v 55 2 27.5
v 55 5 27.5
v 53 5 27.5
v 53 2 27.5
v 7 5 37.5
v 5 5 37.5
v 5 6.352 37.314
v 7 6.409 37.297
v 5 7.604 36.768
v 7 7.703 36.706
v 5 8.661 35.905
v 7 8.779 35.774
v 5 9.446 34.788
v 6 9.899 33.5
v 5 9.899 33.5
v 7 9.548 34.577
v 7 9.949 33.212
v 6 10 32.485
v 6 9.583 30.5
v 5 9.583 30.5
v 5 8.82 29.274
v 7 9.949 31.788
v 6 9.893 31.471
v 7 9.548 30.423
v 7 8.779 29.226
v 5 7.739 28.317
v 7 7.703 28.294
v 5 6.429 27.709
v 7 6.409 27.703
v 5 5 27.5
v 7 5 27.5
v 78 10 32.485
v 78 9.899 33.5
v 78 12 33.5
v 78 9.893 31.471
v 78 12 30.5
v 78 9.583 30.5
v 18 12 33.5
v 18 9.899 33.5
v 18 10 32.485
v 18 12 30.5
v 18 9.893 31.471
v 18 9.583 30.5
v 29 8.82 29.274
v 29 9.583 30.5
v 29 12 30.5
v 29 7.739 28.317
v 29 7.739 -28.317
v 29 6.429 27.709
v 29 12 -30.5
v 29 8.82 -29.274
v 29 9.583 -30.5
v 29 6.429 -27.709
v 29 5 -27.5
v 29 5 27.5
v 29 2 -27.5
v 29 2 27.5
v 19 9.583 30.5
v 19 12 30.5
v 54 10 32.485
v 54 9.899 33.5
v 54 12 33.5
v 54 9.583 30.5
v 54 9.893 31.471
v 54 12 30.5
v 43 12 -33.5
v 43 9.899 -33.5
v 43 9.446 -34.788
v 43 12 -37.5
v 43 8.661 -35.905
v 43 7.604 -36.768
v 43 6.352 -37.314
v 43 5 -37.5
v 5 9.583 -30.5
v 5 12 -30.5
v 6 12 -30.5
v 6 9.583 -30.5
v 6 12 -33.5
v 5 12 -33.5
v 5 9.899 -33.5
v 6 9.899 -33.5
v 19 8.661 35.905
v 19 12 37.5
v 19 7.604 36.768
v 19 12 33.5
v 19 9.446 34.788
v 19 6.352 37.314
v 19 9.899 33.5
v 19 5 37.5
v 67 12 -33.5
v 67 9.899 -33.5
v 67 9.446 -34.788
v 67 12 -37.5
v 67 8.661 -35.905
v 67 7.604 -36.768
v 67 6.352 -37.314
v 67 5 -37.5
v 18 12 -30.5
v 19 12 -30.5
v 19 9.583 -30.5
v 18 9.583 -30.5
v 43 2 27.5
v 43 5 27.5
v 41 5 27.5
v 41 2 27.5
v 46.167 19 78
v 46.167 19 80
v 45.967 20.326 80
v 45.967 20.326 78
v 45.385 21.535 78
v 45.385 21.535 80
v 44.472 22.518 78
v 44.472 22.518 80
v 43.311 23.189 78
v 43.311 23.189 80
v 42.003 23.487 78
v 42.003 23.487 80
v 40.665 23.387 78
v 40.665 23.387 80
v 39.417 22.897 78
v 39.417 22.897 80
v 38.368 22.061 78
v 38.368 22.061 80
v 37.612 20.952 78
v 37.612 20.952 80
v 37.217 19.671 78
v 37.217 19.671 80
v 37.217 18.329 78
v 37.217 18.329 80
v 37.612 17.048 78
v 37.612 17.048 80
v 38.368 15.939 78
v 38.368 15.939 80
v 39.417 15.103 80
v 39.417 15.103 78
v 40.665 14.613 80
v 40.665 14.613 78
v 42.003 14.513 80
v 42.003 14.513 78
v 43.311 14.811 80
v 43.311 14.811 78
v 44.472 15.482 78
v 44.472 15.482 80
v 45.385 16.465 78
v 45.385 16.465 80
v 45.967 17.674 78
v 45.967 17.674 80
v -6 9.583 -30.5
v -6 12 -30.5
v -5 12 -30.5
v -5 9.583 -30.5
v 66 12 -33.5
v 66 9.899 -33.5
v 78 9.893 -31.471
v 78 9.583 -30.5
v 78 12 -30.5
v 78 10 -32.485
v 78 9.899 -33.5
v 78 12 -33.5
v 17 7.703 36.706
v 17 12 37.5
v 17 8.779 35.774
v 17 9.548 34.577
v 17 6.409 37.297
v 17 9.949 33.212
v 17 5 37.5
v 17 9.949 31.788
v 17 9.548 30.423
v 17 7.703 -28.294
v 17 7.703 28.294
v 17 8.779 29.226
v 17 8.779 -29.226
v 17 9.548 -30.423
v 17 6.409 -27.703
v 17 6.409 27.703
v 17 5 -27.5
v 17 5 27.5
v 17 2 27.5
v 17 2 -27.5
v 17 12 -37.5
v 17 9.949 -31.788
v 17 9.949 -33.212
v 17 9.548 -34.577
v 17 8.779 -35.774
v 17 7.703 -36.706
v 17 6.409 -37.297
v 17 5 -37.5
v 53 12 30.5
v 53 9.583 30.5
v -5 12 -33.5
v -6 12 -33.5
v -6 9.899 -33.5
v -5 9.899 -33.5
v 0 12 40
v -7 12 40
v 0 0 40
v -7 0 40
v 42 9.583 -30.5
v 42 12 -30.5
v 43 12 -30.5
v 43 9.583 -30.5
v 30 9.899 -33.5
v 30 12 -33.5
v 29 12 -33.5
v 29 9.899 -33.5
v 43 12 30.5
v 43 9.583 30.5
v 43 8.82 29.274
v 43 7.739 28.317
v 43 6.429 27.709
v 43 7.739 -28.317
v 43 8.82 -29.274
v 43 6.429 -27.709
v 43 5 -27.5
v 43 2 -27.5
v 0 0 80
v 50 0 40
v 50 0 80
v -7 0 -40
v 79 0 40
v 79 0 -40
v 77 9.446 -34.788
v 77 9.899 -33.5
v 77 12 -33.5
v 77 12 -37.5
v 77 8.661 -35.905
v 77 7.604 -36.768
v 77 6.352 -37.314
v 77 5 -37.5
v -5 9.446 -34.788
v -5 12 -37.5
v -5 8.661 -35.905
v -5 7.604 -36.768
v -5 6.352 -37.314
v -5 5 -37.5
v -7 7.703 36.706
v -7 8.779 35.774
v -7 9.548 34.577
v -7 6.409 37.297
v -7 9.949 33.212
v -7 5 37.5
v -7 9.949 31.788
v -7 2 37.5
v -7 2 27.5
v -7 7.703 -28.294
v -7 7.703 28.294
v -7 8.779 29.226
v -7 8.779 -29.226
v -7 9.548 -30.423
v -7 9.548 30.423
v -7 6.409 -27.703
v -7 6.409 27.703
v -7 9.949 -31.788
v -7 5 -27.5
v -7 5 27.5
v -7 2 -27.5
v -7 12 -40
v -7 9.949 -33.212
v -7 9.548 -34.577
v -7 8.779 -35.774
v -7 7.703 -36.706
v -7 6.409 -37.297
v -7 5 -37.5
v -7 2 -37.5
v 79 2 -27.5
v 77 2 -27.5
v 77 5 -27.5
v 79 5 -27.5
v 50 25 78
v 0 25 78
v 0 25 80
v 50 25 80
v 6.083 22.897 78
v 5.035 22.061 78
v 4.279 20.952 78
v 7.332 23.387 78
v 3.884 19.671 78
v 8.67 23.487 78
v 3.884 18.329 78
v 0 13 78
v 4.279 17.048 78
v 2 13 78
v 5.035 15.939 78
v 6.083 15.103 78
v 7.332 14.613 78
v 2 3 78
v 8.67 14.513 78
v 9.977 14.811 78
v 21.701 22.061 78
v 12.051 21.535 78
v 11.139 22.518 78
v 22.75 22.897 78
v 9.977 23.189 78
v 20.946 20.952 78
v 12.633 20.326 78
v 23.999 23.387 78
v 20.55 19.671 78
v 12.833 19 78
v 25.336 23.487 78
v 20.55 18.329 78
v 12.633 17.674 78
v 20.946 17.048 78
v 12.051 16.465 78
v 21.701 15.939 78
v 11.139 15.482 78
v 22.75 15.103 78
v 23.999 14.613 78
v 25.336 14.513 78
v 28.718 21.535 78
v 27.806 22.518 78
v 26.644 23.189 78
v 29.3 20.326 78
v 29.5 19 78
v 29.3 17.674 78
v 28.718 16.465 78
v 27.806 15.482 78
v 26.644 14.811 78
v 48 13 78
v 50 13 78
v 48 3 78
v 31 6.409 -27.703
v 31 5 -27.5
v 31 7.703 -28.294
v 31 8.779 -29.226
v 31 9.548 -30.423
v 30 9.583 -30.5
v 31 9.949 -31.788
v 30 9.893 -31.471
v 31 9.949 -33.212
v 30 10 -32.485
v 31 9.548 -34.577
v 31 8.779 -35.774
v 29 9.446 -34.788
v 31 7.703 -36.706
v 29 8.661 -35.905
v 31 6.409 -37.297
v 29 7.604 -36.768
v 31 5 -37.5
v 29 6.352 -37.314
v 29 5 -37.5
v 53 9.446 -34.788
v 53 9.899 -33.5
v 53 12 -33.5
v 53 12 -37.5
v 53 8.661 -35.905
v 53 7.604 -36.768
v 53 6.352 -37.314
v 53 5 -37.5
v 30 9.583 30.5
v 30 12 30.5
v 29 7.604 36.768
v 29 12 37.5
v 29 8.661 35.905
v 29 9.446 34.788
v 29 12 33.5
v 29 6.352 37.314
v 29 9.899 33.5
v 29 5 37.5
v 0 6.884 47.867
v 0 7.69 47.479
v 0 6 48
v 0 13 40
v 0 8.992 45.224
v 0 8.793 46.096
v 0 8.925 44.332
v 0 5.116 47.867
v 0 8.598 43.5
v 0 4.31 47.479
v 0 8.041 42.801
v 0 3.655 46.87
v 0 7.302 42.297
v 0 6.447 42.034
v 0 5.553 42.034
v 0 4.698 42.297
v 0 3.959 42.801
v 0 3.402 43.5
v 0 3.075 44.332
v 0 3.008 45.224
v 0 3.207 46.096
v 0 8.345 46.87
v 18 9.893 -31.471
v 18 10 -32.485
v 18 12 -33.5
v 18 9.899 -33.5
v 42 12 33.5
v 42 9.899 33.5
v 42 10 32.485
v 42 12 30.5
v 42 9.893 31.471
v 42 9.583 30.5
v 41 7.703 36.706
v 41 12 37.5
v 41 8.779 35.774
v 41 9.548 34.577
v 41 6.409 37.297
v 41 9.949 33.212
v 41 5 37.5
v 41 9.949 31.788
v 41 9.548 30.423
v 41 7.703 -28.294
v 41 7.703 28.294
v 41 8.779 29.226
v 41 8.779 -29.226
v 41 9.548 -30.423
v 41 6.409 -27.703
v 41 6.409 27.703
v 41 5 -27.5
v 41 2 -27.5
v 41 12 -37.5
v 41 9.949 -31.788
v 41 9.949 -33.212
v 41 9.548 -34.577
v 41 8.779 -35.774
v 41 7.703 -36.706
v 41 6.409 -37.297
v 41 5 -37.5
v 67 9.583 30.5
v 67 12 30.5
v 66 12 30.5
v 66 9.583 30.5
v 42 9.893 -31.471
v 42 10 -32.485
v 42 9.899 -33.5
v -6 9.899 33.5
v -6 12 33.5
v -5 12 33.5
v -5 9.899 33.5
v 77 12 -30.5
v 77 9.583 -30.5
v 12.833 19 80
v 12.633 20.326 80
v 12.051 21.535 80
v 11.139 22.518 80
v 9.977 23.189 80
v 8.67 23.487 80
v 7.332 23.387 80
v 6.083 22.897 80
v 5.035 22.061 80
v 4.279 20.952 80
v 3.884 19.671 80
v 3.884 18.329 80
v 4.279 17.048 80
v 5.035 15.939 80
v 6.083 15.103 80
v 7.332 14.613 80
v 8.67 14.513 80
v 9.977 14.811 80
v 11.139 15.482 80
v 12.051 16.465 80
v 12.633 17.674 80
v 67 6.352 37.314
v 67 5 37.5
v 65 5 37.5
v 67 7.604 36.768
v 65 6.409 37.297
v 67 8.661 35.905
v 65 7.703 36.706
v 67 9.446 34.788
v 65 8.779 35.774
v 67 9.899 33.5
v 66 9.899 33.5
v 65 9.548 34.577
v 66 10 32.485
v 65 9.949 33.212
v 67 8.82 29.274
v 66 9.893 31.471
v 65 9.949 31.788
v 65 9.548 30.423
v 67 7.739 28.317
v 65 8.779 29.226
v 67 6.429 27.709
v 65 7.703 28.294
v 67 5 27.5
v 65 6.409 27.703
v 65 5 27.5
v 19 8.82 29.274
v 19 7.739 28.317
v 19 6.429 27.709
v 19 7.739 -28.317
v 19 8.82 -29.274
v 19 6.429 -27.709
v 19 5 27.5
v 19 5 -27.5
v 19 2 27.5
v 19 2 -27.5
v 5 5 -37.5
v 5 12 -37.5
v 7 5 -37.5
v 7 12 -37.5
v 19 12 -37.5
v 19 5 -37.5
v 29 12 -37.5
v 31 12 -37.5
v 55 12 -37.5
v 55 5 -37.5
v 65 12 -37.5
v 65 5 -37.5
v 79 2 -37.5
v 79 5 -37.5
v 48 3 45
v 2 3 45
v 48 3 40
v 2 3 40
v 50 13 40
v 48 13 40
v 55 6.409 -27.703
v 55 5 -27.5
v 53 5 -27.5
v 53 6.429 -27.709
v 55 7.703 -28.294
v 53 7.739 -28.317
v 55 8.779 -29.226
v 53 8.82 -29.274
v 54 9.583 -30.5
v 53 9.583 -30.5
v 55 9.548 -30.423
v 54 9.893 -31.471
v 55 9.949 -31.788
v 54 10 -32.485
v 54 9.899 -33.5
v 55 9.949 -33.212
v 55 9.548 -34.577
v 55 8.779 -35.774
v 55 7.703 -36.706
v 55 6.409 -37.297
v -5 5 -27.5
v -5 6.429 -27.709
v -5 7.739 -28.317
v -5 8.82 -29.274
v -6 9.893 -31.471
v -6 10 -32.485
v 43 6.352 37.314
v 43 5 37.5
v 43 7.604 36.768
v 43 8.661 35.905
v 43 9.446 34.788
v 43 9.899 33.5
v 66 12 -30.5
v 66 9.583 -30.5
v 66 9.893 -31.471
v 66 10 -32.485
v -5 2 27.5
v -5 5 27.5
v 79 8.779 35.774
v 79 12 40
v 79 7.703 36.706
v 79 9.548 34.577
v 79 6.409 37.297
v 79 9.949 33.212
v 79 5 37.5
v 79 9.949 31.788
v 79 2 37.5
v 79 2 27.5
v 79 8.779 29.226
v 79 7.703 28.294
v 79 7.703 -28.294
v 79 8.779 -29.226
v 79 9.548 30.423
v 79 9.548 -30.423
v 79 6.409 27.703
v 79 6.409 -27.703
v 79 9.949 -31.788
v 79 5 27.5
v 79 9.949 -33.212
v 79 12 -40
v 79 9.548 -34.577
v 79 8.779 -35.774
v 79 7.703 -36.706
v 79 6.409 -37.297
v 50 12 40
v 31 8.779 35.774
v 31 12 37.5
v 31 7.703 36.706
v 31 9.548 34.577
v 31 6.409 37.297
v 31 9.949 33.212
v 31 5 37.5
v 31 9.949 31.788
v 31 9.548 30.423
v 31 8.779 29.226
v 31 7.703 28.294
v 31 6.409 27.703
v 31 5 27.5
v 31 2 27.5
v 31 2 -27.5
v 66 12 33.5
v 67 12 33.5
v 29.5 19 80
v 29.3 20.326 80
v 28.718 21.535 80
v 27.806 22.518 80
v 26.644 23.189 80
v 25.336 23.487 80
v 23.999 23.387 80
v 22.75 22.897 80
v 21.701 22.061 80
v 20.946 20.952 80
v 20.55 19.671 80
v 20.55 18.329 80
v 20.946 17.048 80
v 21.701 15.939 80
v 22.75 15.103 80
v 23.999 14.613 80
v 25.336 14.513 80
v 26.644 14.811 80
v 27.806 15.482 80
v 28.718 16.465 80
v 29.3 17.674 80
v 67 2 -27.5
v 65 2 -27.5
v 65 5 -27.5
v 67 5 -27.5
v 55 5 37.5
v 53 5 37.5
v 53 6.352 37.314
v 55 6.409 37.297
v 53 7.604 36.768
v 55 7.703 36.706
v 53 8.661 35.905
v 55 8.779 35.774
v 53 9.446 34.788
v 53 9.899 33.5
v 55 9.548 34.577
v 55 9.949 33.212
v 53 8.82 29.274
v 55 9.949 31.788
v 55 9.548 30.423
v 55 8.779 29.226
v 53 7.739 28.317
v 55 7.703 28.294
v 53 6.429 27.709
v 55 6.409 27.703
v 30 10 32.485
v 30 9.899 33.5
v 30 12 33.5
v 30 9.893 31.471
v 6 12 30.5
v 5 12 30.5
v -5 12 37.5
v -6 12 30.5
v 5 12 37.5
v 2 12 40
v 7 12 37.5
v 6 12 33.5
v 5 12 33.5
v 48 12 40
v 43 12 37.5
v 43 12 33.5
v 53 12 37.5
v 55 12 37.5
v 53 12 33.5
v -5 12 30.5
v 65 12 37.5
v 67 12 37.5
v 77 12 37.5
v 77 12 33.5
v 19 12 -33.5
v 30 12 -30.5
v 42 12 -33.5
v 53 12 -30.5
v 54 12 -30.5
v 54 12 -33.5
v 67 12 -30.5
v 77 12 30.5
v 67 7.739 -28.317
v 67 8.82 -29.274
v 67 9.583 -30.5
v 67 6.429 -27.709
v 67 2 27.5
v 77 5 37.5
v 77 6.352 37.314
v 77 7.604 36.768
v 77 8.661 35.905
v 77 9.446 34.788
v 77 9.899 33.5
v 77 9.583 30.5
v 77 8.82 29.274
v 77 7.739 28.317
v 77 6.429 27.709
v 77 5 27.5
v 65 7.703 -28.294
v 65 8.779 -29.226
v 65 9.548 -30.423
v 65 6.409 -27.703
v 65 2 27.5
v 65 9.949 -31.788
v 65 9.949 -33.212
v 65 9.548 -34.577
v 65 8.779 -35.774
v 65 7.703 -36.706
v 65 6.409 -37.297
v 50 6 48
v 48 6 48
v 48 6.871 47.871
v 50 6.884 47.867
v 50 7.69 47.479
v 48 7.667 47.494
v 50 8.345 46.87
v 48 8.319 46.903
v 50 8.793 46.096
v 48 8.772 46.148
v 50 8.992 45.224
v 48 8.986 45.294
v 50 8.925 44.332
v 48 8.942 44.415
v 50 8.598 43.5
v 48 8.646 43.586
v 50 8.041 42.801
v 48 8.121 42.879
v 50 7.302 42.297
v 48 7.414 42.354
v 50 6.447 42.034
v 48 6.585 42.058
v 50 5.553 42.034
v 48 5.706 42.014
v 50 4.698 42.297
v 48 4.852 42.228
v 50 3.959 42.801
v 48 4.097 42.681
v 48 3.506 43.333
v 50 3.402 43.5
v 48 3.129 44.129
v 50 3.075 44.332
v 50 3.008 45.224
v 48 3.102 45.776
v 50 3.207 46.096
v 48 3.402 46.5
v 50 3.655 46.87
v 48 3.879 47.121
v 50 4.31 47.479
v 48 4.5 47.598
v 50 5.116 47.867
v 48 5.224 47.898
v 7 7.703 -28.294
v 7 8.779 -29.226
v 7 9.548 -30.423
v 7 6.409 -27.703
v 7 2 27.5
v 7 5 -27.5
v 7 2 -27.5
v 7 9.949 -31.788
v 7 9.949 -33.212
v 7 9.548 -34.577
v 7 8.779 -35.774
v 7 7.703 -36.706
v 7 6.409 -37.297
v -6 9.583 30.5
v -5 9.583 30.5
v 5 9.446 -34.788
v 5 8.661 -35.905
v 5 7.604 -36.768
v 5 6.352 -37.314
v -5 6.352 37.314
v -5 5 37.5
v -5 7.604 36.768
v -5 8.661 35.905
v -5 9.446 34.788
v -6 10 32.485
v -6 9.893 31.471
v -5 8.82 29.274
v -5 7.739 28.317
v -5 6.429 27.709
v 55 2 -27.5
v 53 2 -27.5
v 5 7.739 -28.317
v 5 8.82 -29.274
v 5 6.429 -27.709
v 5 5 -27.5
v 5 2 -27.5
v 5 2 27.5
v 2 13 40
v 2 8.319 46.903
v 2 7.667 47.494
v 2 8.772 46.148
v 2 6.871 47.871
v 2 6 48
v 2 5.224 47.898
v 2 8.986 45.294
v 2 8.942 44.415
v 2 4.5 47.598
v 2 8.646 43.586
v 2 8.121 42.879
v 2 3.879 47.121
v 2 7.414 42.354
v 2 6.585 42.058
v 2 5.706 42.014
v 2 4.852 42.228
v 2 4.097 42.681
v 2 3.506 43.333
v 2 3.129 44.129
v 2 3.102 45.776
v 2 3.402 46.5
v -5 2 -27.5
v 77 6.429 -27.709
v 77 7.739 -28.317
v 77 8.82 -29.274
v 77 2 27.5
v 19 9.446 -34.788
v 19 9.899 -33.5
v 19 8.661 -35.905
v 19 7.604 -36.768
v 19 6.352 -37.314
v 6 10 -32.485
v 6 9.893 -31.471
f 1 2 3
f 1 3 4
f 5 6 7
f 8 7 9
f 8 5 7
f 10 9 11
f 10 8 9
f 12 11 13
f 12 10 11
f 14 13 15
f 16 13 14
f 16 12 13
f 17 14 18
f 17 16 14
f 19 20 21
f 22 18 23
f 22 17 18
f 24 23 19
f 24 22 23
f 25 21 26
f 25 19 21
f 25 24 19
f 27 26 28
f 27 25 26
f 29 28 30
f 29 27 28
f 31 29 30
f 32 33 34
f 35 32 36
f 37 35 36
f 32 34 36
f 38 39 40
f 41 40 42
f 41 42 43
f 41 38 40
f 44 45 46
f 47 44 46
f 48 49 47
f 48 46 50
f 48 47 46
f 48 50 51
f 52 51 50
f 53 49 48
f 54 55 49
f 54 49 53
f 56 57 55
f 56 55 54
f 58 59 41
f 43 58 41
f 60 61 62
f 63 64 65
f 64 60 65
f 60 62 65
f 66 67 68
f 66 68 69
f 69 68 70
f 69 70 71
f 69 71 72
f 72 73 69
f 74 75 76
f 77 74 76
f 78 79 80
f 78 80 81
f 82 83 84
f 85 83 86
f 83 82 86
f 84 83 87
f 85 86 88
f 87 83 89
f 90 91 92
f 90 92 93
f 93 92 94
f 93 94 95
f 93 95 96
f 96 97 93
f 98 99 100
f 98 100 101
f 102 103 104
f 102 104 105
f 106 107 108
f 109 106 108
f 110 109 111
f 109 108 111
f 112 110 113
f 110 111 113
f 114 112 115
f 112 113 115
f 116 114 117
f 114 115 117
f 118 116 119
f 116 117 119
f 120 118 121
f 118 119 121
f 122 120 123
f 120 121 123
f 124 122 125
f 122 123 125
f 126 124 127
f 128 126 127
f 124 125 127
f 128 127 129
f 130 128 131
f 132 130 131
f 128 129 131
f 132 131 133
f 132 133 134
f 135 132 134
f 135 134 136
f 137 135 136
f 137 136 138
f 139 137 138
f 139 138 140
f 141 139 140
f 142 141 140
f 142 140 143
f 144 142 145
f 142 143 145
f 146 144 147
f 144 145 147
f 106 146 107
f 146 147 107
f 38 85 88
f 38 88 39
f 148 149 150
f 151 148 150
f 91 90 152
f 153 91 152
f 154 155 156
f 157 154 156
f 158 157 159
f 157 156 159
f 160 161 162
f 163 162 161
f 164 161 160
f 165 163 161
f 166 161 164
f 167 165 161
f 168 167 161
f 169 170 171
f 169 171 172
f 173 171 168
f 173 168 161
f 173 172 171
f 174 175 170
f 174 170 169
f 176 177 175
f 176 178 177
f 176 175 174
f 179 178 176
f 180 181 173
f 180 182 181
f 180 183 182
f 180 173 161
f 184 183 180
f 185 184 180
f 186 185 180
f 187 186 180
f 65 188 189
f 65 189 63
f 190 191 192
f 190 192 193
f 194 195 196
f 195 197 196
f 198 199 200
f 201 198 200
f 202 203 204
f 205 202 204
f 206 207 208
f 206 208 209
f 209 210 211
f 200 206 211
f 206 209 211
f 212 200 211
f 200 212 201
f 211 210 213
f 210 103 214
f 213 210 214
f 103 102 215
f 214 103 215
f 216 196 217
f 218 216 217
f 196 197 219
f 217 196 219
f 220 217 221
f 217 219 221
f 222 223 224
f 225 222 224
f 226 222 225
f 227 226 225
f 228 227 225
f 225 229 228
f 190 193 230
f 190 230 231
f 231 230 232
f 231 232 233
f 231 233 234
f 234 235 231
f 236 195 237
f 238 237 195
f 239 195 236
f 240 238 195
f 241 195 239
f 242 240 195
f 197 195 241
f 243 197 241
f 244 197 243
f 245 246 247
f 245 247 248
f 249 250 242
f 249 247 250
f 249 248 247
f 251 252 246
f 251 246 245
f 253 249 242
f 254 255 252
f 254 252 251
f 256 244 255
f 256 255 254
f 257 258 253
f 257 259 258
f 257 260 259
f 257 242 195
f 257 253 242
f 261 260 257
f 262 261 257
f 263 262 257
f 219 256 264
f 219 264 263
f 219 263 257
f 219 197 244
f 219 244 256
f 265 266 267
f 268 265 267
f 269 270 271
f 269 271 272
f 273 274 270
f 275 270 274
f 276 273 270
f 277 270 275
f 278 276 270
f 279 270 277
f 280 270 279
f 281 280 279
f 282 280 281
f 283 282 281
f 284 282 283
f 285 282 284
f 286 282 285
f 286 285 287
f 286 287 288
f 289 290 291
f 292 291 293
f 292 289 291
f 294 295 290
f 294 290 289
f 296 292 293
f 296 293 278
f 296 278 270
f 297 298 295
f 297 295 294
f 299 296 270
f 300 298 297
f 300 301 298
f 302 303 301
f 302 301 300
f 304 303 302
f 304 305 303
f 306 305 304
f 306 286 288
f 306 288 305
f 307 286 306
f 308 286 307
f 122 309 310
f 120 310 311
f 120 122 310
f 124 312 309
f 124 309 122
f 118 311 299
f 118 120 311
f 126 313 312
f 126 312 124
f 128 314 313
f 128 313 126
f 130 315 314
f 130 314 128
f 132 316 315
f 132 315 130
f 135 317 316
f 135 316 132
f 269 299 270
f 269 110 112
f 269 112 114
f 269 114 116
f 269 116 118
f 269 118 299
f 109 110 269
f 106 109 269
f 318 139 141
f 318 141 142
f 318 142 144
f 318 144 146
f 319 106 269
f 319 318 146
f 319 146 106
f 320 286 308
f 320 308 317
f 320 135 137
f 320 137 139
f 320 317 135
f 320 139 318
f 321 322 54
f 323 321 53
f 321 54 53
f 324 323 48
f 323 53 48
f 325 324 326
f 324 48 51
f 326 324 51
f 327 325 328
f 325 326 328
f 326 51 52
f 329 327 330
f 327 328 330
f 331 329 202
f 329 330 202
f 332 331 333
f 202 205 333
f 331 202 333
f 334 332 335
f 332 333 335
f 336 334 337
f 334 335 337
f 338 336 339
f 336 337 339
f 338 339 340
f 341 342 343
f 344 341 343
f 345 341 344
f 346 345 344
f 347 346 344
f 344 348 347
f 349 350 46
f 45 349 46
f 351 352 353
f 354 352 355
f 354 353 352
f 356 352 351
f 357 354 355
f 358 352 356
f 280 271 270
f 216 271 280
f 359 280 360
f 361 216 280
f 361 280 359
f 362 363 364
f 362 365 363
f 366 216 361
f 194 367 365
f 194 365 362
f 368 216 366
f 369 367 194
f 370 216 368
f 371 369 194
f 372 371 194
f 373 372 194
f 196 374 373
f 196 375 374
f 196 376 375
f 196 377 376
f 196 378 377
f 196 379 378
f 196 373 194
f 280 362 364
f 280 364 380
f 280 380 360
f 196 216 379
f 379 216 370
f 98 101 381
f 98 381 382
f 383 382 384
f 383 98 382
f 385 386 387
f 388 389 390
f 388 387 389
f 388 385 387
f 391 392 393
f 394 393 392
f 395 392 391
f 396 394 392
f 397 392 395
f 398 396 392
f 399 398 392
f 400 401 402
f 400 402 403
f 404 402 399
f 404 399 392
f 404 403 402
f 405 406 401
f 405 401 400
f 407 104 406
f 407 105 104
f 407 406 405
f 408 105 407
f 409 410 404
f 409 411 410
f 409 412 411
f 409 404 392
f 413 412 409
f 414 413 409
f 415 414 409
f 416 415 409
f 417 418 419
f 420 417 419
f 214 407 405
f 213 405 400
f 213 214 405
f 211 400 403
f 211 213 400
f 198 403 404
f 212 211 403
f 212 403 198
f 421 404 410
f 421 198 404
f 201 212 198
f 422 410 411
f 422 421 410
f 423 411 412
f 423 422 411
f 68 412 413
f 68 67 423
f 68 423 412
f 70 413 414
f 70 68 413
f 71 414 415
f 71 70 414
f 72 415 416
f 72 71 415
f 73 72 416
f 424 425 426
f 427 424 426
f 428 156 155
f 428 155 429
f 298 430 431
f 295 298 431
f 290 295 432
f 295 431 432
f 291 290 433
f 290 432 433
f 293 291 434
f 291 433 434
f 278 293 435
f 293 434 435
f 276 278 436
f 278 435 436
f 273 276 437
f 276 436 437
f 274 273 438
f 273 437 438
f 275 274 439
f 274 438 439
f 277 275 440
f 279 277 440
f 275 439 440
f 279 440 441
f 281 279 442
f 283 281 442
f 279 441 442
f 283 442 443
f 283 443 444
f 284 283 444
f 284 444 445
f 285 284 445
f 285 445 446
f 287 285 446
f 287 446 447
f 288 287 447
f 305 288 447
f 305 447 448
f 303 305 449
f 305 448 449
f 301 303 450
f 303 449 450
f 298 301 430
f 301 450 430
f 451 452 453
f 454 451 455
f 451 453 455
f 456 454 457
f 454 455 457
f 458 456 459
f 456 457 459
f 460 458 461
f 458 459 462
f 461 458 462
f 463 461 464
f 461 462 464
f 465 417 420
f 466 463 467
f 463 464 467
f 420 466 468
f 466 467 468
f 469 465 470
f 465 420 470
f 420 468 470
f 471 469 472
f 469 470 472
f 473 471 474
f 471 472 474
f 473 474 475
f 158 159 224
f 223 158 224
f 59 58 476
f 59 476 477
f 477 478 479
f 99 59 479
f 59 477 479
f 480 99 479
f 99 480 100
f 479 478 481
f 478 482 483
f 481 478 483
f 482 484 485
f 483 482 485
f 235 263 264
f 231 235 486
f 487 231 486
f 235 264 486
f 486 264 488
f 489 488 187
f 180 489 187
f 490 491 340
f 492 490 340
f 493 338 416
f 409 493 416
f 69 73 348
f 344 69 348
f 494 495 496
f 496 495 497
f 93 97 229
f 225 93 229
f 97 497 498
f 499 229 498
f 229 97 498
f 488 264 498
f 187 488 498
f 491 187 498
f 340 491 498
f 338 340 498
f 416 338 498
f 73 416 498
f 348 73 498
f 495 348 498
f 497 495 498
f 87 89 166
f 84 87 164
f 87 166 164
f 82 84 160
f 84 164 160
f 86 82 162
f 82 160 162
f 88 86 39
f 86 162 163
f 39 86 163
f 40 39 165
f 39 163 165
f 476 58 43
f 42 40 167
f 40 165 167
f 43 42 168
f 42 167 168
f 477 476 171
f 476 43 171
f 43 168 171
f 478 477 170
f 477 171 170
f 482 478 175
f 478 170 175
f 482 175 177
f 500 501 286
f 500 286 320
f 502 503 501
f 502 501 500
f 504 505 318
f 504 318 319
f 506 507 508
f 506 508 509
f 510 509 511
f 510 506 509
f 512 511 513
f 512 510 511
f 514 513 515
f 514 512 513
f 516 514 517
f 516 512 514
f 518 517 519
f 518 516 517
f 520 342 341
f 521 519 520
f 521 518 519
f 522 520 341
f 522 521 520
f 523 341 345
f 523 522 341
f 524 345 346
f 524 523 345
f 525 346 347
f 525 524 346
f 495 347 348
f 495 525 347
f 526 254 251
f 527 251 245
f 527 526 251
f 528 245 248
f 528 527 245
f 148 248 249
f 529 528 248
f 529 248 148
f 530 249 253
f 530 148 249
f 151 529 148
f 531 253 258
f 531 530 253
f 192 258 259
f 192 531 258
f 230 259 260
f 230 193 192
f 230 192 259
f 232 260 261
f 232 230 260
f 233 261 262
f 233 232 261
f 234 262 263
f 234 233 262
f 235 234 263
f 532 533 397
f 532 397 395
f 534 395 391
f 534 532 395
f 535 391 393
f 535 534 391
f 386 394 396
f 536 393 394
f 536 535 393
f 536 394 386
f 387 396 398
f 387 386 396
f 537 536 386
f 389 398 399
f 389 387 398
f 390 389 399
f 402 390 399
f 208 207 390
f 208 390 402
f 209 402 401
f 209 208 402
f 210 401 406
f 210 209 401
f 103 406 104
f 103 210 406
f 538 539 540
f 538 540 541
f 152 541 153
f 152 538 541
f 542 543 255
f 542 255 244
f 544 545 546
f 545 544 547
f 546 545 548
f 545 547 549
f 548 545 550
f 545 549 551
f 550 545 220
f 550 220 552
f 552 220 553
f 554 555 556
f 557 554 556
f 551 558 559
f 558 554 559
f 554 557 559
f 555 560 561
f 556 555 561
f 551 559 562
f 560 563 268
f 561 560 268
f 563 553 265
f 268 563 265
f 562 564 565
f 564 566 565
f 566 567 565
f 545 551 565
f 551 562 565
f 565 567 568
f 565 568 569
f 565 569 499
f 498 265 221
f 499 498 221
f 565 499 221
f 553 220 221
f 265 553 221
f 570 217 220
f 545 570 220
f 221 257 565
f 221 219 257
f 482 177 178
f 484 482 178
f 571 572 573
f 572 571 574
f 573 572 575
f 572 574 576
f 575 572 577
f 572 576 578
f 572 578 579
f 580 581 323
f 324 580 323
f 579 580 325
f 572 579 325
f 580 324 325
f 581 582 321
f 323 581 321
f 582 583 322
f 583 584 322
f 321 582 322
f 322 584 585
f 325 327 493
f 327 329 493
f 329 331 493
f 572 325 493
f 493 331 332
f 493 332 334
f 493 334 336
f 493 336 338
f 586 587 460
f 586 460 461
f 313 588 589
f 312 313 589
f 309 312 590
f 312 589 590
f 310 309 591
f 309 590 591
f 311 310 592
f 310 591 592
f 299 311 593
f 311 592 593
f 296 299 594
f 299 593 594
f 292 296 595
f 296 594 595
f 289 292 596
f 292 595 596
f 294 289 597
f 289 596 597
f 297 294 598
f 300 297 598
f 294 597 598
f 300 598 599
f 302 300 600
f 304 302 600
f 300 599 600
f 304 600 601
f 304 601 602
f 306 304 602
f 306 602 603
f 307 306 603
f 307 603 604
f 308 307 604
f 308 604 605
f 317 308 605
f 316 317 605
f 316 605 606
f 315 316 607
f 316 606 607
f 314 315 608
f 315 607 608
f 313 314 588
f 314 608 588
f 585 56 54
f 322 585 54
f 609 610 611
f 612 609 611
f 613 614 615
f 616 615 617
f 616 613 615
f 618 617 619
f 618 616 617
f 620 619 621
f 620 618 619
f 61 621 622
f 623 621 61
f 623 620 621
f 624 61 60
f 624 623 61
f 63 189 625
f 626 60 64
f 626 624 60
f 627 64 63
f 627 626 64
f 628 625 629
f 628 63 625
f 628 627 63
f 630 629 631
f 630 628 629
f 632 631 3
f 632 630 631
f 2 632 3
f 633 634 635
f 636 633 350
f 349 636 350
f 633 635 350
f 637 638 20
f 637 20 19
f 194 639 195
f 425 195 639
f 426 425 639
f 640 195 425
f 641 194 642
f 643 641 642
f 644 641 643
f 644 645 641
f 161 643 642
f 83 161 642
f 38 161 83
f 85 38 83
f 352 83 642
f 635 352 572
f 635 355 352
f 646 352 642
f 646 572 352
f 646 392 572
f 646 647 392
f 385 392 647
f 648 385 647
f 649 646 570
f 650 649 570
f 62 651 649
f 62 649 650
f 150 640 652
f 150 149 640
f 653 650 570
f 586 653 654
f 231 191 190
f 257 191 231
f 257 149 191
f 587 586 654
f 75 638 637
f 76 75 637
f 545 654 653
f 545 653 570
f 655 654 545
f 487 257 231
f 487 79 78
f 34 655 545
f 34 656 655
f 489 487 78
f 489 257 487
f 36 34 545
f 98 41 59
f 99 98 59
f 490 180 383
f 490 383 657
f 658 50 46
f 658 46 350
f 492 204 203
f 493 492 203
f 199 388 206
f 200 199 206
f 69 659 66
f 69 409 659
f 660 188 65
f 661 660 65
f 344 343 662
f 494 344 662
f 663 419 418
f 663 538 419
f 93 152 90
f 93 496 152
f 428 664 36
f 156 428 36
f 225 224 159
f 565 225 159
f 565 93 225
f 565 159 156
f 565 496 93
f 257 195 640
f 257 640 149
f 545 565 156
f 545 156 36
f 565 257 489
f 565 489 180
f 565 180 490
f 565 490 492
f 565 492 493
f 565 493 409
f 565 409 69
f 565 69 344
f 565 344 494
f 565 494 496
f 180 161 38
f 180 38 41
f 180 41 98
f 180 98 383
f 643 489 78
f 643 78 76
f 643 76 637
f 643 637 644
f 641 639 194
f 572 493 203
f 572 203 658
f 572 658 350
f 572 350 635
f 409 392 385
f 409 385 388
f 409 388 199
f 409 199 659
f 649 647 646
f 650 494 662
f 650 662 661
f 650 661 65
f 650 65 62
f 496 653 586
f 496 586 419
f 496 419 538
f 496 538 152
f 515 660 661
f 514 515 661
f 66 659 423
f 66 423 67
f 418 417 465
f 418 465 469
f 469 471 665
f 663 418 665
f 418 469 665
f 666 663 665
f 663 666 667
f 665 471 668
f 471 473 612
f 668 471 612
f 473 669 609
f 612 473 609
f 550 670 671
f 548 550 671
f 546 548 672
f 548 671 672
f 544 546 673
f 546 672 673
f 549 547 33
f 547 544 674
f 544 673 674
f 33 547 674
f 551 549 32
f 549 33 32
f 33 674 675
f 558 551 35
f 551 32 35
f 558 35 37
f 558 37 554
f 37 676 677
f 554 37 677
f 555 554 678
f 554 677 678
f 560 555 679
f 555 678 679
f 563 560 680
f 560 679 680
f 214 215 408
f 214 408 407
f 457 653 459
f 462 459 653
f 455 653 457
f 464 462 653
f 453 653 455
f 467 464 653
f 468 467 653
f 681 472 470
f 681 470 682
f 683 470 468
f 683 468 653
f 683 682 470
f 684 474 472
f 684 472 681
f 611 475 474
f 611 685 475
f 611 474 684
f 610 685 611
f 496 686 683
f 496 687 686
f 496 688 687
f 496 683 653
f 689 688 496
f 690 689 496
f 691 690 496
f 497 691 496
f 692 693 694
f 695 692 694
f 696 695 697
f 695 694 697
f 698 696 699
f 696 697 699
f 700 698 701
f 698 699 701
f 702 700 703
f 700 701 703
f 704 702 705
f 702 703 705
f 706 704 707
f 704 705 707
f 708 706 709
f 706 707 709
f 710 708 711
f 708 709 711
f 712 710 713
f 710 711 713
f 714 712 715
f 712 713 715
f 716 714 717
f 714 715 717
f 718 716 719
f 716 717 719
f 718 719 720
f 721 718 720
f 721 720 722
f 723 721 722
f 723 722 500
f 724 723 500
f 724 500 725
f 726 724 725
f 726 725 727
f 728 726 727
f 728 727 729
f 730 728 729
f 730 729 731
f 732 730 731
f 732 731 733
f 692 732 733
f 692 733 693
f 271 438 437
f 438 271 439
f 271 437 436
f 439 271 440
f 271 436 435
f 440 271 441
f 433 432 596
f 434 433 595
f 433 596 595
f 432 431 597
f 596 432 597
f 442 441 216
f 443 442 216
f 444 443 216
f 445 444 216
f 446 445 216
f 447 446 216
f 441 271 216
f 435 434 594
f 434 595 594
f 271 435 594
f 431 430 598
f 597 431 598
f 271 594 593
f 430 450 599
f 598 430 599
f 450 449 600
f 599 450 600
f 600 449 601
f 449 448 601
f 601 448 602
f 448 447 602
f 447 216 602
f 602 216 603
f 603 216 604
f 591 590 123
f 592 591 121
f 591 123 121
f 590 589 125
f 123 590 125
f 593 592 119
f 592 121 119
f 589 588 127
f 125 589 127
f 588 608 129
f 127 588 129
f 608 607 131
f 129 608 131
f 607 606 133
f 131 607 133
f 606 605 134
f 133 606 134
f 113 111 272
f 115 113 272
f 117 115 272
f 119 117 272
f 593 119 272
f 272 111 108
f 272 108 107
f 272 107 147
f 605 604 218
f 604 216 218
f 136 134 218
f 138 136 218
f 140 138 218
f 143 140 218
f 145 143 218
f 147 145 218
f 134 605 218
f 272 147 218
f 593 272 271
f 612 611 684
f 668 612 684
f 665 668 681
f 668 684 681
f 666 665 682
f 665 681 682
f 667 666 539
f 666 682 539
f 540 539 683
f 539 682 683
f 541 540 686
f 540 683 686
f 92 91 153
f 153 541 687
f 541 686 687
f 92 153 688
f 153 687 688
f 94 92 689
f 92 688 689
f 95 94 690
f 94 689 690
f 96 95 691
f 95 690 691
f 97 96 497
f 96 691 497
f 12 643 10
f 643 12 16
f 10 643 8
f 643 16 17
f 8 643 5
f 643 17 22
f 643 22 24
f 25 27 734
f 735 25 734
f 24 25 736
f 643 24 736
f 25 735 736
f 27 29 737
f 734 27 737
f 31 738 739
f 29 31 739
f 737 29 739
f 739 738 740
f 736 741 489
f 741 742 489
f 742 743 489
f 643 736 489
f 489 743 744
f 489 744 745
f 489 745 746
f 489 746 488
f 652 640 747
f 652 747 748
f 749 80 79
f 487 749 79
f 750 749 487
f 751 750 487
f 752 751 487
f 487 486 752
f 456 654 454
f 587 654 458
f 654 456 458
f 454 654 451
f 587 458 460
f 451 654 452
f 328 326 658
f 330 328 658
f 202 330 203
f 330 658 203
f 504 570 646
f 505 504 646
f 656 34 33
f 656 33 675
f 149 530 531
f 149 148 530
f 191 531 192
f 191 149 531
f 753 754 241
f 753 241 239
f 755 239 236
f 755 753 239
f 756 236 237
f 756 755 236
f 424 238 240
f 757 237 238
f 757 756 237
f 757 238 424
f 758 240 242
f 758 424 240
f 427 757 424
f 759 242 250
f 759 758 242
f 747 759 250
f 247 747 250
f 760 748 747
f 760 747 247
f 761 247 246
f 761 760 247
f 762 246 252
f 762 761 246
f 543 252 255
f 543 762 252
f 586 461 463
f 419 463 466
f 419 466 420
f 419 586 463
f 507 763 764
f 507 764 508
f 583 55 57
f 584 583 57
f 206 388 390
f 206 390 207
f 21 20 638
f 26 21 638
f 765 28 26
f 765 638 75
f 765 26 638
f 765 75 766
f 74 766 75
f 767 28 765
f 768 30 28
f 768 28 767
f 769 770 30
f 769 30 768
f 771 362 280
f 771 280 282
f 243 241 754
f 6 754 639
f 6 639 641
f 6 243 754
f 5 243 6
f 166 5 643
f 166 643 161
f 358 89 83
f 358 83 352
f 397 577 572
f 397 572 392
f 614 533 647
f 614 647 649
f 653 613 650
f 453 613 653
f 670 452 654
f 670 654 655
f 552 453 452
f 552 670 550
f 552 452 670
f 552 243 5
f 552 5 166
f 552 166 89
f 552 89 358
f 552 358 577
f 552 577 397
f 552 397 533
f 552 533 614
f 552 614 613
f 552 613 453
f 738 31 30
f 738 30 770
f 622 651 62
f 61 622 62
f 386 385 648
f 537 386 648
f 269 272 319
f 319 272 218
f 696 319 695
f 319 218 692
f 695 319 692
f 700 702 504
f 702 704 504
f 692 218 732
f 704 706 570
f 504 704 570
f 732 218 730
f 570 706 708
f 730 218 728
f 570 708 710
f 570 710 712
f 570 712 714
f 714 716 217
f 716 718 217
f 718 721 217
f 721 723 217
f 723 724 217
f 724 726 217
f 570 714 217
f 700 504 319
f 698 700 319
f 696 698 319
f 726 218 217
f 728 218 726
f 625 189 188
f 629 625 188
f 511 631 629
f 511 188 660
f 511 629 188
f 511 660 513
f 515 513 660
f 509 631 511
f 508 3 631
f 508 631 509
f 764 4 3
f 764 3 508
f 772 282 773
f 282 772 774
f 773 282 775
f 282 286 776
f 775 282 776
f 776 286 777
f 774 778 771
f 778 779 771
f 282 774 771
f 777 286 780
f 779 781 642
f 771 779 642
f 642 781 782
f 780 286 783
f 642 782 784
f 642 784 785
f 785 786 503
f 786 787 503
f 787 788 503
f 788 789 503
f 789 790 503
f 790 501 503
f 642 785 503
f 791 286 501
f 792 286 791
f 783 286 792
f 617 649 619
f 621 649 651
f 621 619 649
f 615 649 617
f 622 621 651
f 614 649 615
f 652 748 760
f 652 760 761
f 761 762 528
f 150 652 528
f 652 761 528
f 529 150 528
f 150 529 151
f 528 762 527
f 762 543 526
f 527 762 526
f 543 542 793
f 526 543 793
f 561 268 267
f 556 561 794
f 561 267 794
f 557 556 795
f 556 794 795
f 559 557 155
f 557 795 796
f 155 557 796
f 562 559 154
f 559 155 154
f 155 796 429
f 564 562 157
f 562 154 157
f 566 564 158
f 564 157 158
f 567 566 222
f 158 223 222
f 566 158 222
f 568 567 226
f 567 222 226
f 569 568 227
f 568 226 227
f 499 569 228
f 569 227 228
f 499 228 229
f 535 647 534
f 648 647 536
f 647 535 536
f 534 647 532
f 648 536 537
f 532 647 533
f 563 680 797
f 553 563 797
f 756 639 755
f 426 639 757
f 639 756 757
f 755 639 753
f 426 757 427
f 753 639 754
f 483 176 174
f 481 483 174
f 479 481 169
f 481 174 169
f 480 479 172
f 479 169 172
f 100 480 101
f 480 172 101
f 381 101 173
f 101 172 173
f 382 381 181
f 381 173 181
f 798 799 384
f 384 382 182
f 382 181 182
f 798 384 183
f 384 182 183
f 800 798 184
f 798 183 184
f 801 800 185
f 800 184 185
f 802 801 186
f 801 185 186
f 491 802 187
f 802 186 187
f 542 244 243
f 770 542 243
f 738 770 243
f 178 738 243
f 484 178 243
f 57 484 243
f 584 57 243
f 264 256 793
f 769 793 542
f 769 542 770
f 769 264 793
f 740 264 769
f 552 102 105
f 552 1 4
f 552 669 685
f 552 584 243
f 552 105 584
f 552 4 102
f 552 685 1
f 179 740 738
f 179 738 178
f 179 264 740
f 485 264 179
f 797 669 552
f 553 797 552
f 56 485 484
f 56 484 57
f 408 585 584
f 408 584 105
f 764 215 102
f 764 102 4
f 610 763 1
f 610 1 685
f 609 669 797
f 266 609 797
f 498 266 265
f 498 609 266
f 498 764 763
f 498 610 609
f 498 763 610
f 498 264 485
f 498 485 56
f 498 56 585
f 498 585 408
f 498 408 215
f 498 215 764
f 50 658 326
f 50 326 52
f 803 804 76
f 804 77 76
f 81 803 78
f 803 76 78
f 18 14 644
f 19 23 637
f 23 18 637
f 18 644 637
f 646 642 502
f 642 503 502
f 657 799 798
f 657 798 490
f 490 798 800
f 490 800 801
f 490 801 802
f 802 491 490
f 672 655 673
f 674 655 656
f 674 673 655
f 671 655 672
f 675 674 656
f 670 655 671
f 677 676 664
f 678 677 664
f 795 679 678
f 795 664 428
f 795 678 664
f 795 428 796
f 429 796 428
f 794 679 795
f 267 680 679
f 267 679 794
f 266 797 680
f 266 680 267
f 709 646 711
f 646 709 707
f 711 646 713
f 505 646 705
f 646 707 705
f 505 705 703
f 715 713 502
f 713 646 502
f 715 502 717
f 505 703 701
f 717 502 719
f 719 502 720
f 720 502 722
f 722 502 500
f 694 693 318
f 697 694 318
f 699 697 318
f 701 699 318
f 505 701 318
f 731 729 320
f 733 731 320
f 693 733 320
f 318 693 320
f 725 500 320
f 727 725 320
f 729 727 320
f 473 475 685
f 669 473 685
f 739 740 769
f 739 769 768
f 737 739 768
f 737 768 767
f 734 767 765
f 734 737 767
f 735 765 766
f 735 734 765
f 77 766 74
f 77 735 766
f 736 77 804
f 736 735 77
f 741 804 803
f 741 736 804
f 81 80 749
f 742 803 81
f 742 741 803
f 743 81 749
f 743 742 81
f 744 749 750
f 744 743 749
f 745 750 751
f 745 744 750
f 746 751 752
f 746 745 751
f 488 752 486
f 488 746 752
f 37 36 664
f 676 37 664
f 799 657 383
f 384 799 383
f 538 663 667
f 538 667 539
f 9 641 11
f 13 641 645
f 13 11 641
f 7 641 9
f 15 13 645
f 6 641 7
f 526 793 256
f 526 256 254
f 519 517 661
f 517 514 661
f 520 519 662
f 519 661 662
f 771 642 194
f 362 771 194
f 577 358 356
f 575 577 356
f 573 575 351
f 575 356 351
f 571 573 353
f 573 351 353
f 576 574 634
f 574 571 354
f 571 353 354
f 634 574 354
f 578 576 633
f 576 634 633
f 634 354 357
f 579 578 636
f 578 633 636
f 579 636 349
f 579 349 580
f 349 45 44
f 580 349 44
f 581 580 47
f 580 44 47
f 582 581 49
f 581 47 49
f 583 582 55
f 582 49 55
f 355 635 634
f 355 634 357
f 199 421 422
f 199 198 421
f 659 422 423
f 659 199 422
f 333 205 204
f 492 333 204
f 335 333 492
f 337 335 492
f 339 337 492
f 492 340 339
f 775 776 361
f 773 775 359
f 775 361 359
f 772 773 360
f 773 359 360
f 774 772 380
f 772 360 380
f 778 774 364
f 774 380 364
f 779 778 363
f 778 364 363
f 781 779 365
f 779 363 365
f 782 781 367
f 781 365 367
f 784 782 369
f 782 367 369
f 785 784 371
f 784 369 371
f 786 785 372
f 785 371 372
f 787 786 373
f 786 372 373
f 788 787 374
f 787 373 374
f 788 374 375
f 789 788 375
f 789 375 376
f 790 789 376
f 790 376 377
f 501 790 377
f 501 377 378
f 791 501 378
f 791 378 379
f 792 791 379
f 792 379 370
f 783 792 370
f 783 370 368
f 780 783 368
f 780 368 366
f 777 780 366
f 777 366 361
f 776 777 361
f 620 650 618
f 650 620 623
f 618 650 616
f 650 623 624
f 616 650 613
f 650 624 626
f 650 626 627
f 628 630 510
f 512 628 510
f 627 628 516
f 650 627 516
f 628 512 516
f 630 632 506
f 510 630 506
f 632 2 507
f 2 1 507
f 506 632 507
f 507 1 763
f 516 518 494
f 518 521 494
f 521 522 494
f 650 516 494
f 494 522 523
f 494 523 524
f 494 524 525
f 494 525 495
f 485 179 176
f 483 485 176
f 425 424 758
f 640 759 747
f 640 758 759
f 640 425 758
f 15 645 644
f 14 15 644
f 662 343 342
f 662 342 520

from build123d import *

# Parameters (mm, degrees)
SKETCH1_W               = 14
SKETCH1_H               = 80
BOSS_EXTRUDE1_DEPTH     = 2
SKETCH2_W               = 14
SKETCH2_H               = 80
SKETCH2_W_2             = 10
SKETCH2_H_2             = 75
BOSS_EXTRUDE2_DEPTH     = 10
SKETCH3_W               = 1
SKETCH3_H               = 3
CUT_EXTRUDE1_DEPTH      = 10
CUT_EXTRUDE2_DEPTH      = 14
SKETCH5_W               = 72
SKETCH5_H               = 80
BOSS_EXTRUDE3_DEPTH     = 2
SKETCH6_W               = 14
SKETCH6_H               = 80
SKETCH6_W_2             = 10
SKETCH6_H_2             = 75
BOSS_EXTRUDE4_DEPTH     = 10
MIRROR2_COPY_1_SKETCH_W = 1
MIRROR2_COPY_1_SKETCH_H = 3
MIRROR2_COPY_1_DEPTH    = 10
MIRROR5_COPY_1_DEPTH    = 14
SKETCH7_W               = 10
SKETCH7_H               = 2.5
BOSS_EXTRUDE5_DEPTH     = 10
SKETCH8_W               = 50
SKETCH8_H               = 40
BOSS_EXTRUDE6_DEPTH     = 3
BOSS_EXTRUDE7_DEPTH     = 10
SKETCH10_R              = 3
CUT_EXTRUDE3_DEPTH      = 50
SKETCH11_W              = 50
SKETCH11_H              = 2
BOSS_EXTRUDE8_DEPTH     = 12
SKETCH12_R              = 4.5
CUT_EXTRUDE4_DEPTH      = 2


with BuildPart() as part:
    # Sketch1 → Boss-Extrude1 (new body)
    with BuildSketch(Plane(origin=(0, 0, 0), x_dir=(1, 0, 0), z_dir=(0, 1, 0))):
        Rectangle(SKETCH1_W, SKETCH1_H)
    extrude(amount=BOSS_EXTRUDE1_DEPTH)

    # Sketch2 → Boss-Extrude2 (add)
    with BuildSketch(Plane(origin=(0, 2, 0), x_dir=(1, 0, 0), z_dir=(0, 1, 0))):
        Rectangle(SKETCH2_W, SKETCH2_H)
        Rectangle(SKETCH2_W_2, SKETCH2_H_2, mode=Mode.SUBTRACT)
    extrude(amount=BOSS_EXTRUDE2_DEPTH)

    # Sketch3 → Cut-Extrude1 (cut)
    with BuildSketch(Plane(origin=(0, 12, 0), x_dir=(1, 0, 0), z_dir=(0, 1, 0))):
        with Locations((-5.5, -32)):
            Rectangle(SKETCH3_W, SKETCH3_H)
        with Locations((5.5, -32)):
            Rectangle(SKETCH3_W, SKETCH3_H)
        with Locations((5.5, 32)):
            Rectangle(SKETCH3_W, SKETCH3_H)
        with Locations((-5.5, 32)):
            Rectangle(SKETCH3_W, SKETCH3_H)
    cut_extrude1 = extrude(amount=-CUT_EXTRUDE1_DEPTH, mode=Mode.SUBTRACT)

    # Sketch4 → Cut-Extrude2 (cut)
    with BuildSketch(Plane(origin=(7, 0, 0), x_dir=(0, 0, -1), z_dir=(1, 0, 0))):
        with BuildLine():
            ThreePointArc((-37.5, 5), (-32.5, 10), (-27.5, 5))
            Line((-27.5, 5), (-27.5, 2))
            Line((-27.5, 2), (-32.5, 2))
            Line((-32.5, 2), (-37.5, 2))
            Line((-37.5, 2), (-37.5, 5))
        make_face()
        with BuildLine():
            ThreePointArc((27.5, 5), (32.5, 10), (37.5, 5))
            Line((37.5, 5), (37.5, 2))
            Line((37.5, 2), (32.5, 2))
            Line((32.5, 2), (27.5, 2))
            Line((27.5, 2), (27.5, 5))
        make_face()
    cut_extrude2 = extrude(amount=-CUT_EXTRUDE2_DEPTH, mode=Mode.SUBTRACT)

    # Sketch5 → Boss-Extrude3 (add)
    with BuildSketch(Plane(origin=(0, 0, 0), x_dir=(1, 0, 0), z_dir=(0, 1, 0))):
        with Locations((43, 0)):
            Rectangle(SKETCH5_W, SKETCH5_H)
    extrude(amount=BOSS_EXTRUDE3_DEPTH)

    # Sketch6 → Boss-Extrude4 (add)
    # profile 1 of 3: a face of its own
    with BuildSketch(Plane(origin=(0, 2, 0), x_dir=(1, 0, 0), z_dir=(0, 1, 0))):
        with Locations((24, 0)):
            Rectangle(SKETCH6_W, SKETCH6_H)
        with Locations((24, 0)):
            Rectangle(SKETCH6_W_2, SKETCH6_H_2, mode=Mode.SUBTRACT)
    # profile 2 of 3: a face of its own
    with BuildSketch(Plane(origin=(0, 2, 0), x_dir=(1, 0, 0), z_dir=(0, 1, 0))):
        with Locations((48, 0)):
            Rectangle(SKETCH6_W, SKETCH6_H)
        with Locations((48, 0)):
            Rectangle(SKETCH6_W_2, SKETCH6_H_2, mode=Mode.SUBTRACT)
    # profile 3 of 3: a face of its own
    with BuildSketch(Plane(origin=(0, 2, 0), x_dir=(1, 0, 0), z_dir=(0, 1, 0))):
        with Locations((72, 0)):
            Rectangle(SKETCH6_W, SKETCH6_H)
        with Locations((72, 0)):
            Rectangle(SKETCH6_W_2, SKETCH6_H_2, mode=Mode.SUBTRACT)
    extrude(amount=BOSS_EXTRUDE4_DEPTH)

    # Mirror1: Cut-Extrude1 across plane
    add(cut_extrude1.mirror(Plane.ZY.offset(-12)), mode=Mode.SUBTRACT)

    # Mirror2: Cut-Extrude1 across plane
    add(cut_extrude1.mirror(Plane.ZY.offset(-36)), mode=Mode.SUBTRACT)

    # Mirror2 copy 1 sketch → Mirror2 copy 1 (cut)
    with BuildSketch(Plane(origin=(48, 12, 0), x_dir=(1, 0, 0), z_dir=(0, 1, 0))):
        with Locations((-5.5, -32)):
            Rectangle(MIRROR2_COPY_1_SKETCH_W, MIRROR2_COPY_1_SKETCH_H)
        with Locations((5.5, -32)):
            Rectangle(MIRROR2_COPY_1_SKETCH_W, MIRROR2_COPY_1_SKETCH_H)
        with Locations((5.5, 32)):
            Rectangle(MIRROR2_COPY_1_SKETCH_W, MIRROR2_COPY_1_SKETCH_H)
        with Locations((-5.5, 32)):
            Rectangle(MIRROR2_COPY_1_SKETCH_W, MIRROR2_COPY_1_SKETCH_H)
    extrude(amount=-MIRROR2_COPY_1_DEPTH, mode=Mode.SUBTRACT)

    # Mirror4: Cut-Extrude2 across plane
    add(cut_extrude2.mirror(Plane.ZY.offset(-12)), mode=Mode.SUBTRACT)

    # Mirror5: Cut-Extrude2 across plane
    add(cut_extrude2.mirror(Plane.ZY.offset(-36)), mode=Mode.SUBTRACT)

    # Mirror5 copy 1 sketch → Mirror5 copy 1 (cut)
    with BuildSketch(Plane(origin=(55, 0, 0), x_dir=(0, 0, -1), z_dir=(1, 0, 0))):
        with BuildLine():
            ThreePointArc((-37.5, 5), (-32.5, 10), (-27.5, 5))
            Line((-27.5, 5), (-27.5, 2))
            Line((-27.5, 2), (-32.5, 2))
            Line((-32.5, 2), (-37.5, 2))
            Line((-37.5, 2), (-37.5, 5))
        make_face()
        with BuildLine():
            ThreePointArc((27.5, 5), (32.5, 10), (37.5, 5))
            Line((37.5, 5), (37.5, 2))
            Line((37.5, 2), (32.5, 2))
            Line((32.5, 2), (27.5, 2))
            Line((27.5, 2), (27.5, 5))
        make_face()
    extrude(amount=-MIRROR5_COPY_1_DEPTH, mode=Mode.SUBTRACT)

    # Sketch7 → Boss-Extrude5 (add)
    with BuildSketch(Plane(origin=(0, 2, 0), x_dir=(1, 0, 0), z_dir=(0, 1, 0))):
        with Locations((12, 38.75)):
            Rectangle(SKETCH7_W, SKETCH7_H)
        with Locations((36, 38.75)):
            Rectangle(SKETCH7_W, SKETCH7_H)
        with Locations((60, 38.75)):
            Rectangle(SKETCH7_W, SKETCH7_H)
        with Locations((60, -38.75)):
            Rectangle(SKETCH7_W, SKETCH7_H)
        with Locations((36, -38.75)):
            Rectangle(SKETCH7_W, SKETCH7_H)
        with Locations((12, -38.75)):
            Rectangle(SKETCH7_W, SKETCH7_H)
    extrude(amount=BOSS_EXTRUDE5_DEPTH)

    # Sketch8 → Boss-Extrude6 (add)
    with BuildSketch(Plane(origin=(0, 0, 0), x_dir=(1, 0, 0), z_dir=(0, 1, 0))):
        with Locations((25, -60)):
            Rectangle(SKETCH8_W, SKETCH8_H)
    extrude(amount=BOSS_EXTRUDE6_DEPTH)

    # Sketch9 → Boss-Extrude7 (add)
    with BuildSketch(Plane(origin=(0, 3, 0), x_dir=(1, 0, 0), z_dir=(0, 1, 0))):
        Polygon((0, -40), (0, -80), (50, -80), (50, -40), (48, -40), (48, -78), (2, -78), (2, -40), align=None)
    extrude(amount=BOSS_EXTRUDE7_DEPTH)

    # Sketch10 → Cut-Extrude3 (cut)
    with BuildSketch(Plane.ZY):
        with Locations((45, 6)):
            Circle(SKETCH10_R)
    extrude(amount=-CUT_EXTRUDE3_DEPTH, mode=Mode.SUBTRACT)

    # Sketch11 → Boss-Extrude8 (add)
    with BuildSketch(Plane(origin=(0, 13, 0), x_dir=(1, 0, 0), z_dir=(0, 1, 0))):
        with Locations((25, -79)):
            Rectangle(SKETCH11_W, SKETCH11_H)
    extrude(amount=BOSS_EXTRUDE8_DEPTH)

    # Sketch12 → Cut-Extrude4 (cut)
    with BuildSketch(Plane.XY.offset(80)):
        with Locations((8.333333333, 19)):
            Circle(SKETCH12_R)
        with Locations((25, 19)):
            Circle(SKETCH12_R)
        with Locations((41.666666667, 19)):
            Circle(SKETCH12_R)
    extrude(amount=-CUT_EXTRUDE4_DEPTH, mode=Mode.SUBTRACT)


solid = part.part
